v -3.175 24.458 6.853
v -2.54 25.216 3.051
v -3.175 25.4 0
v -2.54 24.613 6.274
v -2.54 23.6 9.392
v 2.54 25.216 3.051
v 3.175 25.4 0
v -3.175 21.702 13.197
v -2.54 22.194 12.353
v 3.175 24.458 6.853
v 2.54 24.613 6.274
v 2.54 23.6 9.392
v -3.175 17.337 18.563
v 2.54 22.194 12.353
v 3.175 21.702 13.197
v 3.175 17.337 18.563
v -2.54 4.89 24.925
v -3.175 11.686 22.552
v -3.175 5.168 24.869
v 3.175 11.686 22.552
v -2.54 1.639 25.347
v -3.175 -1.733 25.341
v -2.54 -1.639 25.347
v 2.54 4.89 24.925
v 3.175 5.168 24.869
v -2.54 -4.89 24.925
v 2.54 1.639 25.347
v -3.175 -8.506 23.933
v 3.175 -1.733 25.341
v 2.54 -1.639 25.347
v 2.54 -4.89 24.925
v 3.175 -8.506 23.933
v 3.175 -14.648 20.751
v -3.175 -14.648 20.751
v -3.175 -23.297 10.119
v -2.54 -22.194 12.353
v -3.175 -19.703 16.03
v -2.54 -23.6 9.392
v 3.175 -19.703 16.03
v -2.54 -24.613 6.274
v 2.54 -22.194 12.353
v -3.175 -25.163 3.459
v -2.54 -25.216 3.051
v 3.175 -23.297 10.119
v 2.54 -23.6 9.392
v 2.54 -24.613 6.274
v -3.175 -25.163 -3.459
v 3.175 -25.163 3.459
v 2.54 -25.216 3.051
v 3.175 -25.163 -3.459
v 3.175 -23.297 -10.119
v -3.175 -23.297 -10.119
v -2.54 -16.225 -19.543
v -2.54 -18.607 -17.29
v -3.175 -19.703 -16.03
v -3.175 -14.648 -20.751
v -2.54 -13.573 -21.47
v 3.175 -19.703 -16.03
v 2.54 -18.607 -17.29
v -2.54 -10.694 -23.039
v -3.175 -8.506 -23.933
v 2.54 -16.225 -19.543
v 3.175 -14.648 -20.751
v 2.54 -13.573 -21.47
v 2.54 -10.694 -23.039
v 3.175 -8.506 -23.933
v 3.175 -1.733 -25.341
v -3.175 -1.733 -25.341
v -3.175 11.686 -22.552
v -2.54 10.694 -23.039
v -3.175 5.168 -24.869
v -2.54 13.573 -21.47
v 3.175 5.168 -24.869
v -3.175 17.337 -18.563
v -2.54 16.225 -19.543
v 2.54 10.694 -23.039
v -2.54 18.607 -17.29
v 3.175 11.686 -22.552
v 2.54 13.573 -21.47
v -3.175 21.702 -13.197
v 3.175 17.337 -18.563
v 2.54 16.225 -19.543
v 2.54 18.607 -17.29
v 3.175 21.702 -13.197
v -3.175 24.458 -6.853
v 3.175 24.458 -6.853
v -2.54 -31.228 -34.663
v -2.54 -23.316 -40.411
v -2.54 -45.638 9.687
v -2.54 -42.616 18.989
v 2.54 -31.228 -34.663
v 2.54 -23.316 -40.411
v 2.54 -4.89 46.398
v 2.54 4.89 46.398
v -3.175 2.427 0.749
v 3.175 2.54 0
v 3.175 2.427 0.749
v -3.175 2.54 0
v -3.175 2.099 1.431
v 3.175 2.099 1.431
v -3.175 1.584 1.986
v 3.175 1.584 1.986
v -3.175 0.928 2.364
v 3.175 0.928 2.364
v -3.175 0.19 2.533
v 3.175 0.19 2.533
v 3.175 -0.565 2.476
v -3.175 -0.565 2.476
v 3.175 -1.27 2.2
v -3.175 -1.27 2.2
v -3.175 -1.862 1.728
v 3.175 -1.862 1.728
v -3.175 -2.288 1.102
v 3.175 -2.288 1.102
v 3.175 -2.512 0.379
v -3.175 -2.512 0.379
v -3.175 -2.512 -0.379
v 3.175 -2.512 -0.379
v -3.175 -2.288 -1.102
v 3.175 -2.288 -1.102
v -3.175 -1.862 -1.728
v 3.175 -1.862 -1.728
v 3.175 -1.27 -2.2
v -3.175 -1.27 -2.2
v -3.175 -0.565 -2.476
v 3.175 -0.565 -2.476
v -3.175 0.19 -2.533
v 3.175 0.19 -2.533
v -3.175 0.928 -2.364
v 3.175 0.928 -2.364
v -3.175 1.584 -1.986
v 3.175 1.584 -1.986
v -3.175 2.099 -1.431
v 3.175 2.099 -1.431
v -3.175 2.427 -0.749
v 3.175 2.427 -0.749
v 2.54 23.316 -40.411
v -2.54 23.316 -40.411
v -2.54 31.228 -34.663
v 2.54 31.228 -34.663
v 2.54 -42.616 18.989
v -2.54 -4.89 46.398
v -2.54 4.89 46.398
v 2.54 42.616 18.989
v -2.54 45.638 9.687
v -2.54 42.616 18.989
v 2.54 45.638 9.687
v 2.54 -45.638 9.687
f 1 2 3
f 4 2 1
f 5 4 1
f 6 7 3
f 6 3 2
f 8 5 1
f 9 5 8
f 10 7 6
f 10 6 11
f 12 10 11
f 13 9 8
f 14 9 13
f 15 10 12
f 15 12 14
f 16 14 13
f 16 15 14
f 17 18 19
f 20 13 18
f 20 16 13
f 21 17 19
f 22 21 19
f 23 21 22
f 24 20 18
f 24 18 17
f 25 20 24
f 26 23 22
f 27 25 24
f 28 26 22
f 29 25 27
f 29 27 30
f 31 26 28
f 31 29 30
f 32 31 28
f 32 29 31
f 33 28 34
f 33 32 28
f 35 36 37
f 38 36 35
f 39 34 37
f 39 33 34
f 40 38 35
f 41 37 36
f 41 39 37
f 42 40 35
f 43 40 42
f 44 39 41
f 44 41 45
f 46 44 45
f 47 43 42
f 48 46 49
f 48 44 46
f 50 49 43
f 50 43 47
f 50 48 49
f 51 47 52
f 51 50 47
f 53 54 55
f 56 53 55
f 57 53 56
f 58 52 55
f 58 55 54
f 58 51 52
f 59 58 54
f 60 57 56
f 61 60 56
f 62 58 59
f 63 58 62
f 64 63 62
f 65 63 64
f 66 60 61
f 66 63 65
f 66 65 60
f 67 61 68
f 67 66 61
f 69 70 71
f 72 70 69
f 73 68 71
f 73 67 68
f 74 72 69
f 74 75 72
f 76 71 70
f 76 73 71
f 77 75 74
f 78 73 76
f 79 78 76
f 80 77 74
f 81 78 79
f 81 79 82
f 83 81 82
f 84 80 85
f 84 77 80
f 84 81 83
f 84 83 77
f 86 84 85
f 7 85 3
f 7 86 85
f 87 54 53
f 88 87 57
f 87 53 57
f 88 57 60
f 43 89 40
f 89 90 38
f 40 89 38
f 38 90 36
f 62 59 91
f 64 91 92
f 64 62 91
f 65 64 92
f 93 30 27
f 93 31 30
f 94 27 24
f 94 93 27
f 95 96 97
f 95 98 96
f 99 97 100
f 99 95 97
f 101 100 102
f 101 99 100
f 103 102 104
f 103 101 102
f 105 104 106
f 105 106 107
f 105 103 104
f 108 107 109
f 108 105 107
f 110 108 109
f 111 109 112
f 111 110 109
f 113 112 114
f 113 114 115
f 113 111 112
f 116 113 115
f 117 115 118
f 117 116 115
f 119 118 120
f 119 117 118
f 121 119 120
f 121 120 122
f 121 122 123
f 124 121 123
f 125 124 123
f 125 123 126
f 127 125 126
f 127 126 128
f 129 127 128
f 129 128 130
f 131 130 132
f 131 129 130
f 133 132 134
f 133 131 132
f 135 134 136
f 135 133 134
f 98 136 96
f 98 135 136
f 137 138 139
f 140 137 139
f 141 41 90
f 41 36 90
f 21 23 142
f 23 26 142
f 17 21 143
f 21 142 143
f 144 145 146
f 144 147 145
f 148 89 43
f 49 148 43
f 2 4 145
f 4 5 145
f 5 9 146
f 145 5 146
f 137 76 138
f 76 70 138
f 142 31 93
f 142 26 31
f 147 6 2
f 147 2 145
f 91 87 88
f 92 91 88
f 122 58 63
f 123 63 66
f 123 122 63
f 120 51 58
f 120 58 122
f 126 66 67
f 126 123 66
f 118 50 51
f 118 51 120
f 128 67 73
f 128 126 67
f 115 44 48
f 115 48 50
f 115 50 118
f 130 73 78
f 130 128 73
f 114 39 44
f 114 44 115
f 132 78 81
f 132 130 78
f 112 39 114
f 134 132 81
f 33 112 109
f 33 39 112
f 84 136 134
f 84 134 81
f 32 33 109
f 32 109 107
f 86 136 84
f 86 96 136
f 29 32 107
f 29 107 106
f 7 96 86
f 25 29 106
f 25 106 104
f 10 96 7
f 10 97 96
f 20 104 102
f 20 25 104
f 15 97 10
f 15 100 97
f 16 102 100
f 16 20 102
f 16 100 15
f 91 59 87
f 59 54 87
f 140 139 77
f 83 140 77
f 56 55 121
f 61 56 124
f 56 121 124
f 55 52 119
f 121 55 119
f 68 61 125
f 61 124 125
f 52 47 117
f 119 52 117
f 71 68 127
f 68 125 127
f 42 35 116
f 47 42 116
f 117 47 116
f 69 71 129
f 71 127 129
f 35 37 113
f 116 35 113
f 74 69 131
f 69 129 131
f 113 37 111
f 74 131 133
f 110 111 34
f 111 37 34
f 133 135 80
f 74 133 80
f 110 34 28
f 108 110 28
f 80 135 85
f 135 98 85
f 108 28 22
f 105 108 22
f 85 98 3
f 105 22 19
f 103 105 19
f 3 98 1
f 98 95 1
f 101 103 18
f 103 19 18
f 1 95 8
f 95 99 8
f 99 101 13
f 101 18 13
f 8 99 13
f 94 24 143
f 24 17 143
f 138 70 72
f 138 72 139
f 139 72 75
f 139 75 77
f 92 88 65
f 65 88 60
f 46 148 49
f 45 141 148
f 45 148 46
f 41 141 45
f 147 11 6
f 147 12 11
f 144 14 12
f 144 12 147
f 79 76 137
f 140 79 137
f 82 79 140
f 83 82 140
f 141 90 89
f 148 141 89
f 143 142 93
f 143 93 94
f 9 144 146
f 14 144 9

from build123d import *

# Parameters (mm, degrees)
F2_R     = 25.4
F2_R_2   = 2.54
F3_DEPTH = 3.175
F4_W     = 9.7803566605
F4_H     = 21.473386322
F5_DEPTH = 2.54


# Not quite as in the source:
# - the program builds the solid bodies; features that only make, move or delete a surface that nothing else refers to are left out


with BuildPart() as f3:
    # F2 (on Right) → F3 (new body, symmetric)
    with BuildSketch(Plane.YZ):
        Circle(F2_R)
        Circle(F2_R_2, mode=Mode.SUBTRACT)
    extrude(amount=F3_DEPTH, both=True)

    # F4 (on Right) → F5 (join, symmetric)
    with BuildSketch(Plane.YZ):
        with Locations((0, 35.6615032084)):
            Rectangle(F4_W, F4_H)
        Polygon((-45.638455211, 9.6869952197), (-25.2160512226, 3.0513539194), (-22.1937548034, 12.353025853), (-42.6161587919, 18.9886671533), align=None)
        Polygon((-23.3159381842, -40.4113040748), (-10.6941983874, -23.0389696135), (-18.6066731367, -17.2902202063), (-31.2284129336, -34.6625546676), align=None)
        Polygon((31.2284129336, -34.6625546676), (18.6066731367, -17.2902202063), (10.6941983874, -23.0389696135), (23.3159381842, -40.4113040748), align=None)
        Polygon((42.6161587919, 18.9886671533), (22.1937548034, 12.353025853), (25.2160512226, 3.0513539194), (45.638455211, 9.6869952197), align=None)
    extrude(amount=F5_DEPTH, both=True)


solid = f3.part
